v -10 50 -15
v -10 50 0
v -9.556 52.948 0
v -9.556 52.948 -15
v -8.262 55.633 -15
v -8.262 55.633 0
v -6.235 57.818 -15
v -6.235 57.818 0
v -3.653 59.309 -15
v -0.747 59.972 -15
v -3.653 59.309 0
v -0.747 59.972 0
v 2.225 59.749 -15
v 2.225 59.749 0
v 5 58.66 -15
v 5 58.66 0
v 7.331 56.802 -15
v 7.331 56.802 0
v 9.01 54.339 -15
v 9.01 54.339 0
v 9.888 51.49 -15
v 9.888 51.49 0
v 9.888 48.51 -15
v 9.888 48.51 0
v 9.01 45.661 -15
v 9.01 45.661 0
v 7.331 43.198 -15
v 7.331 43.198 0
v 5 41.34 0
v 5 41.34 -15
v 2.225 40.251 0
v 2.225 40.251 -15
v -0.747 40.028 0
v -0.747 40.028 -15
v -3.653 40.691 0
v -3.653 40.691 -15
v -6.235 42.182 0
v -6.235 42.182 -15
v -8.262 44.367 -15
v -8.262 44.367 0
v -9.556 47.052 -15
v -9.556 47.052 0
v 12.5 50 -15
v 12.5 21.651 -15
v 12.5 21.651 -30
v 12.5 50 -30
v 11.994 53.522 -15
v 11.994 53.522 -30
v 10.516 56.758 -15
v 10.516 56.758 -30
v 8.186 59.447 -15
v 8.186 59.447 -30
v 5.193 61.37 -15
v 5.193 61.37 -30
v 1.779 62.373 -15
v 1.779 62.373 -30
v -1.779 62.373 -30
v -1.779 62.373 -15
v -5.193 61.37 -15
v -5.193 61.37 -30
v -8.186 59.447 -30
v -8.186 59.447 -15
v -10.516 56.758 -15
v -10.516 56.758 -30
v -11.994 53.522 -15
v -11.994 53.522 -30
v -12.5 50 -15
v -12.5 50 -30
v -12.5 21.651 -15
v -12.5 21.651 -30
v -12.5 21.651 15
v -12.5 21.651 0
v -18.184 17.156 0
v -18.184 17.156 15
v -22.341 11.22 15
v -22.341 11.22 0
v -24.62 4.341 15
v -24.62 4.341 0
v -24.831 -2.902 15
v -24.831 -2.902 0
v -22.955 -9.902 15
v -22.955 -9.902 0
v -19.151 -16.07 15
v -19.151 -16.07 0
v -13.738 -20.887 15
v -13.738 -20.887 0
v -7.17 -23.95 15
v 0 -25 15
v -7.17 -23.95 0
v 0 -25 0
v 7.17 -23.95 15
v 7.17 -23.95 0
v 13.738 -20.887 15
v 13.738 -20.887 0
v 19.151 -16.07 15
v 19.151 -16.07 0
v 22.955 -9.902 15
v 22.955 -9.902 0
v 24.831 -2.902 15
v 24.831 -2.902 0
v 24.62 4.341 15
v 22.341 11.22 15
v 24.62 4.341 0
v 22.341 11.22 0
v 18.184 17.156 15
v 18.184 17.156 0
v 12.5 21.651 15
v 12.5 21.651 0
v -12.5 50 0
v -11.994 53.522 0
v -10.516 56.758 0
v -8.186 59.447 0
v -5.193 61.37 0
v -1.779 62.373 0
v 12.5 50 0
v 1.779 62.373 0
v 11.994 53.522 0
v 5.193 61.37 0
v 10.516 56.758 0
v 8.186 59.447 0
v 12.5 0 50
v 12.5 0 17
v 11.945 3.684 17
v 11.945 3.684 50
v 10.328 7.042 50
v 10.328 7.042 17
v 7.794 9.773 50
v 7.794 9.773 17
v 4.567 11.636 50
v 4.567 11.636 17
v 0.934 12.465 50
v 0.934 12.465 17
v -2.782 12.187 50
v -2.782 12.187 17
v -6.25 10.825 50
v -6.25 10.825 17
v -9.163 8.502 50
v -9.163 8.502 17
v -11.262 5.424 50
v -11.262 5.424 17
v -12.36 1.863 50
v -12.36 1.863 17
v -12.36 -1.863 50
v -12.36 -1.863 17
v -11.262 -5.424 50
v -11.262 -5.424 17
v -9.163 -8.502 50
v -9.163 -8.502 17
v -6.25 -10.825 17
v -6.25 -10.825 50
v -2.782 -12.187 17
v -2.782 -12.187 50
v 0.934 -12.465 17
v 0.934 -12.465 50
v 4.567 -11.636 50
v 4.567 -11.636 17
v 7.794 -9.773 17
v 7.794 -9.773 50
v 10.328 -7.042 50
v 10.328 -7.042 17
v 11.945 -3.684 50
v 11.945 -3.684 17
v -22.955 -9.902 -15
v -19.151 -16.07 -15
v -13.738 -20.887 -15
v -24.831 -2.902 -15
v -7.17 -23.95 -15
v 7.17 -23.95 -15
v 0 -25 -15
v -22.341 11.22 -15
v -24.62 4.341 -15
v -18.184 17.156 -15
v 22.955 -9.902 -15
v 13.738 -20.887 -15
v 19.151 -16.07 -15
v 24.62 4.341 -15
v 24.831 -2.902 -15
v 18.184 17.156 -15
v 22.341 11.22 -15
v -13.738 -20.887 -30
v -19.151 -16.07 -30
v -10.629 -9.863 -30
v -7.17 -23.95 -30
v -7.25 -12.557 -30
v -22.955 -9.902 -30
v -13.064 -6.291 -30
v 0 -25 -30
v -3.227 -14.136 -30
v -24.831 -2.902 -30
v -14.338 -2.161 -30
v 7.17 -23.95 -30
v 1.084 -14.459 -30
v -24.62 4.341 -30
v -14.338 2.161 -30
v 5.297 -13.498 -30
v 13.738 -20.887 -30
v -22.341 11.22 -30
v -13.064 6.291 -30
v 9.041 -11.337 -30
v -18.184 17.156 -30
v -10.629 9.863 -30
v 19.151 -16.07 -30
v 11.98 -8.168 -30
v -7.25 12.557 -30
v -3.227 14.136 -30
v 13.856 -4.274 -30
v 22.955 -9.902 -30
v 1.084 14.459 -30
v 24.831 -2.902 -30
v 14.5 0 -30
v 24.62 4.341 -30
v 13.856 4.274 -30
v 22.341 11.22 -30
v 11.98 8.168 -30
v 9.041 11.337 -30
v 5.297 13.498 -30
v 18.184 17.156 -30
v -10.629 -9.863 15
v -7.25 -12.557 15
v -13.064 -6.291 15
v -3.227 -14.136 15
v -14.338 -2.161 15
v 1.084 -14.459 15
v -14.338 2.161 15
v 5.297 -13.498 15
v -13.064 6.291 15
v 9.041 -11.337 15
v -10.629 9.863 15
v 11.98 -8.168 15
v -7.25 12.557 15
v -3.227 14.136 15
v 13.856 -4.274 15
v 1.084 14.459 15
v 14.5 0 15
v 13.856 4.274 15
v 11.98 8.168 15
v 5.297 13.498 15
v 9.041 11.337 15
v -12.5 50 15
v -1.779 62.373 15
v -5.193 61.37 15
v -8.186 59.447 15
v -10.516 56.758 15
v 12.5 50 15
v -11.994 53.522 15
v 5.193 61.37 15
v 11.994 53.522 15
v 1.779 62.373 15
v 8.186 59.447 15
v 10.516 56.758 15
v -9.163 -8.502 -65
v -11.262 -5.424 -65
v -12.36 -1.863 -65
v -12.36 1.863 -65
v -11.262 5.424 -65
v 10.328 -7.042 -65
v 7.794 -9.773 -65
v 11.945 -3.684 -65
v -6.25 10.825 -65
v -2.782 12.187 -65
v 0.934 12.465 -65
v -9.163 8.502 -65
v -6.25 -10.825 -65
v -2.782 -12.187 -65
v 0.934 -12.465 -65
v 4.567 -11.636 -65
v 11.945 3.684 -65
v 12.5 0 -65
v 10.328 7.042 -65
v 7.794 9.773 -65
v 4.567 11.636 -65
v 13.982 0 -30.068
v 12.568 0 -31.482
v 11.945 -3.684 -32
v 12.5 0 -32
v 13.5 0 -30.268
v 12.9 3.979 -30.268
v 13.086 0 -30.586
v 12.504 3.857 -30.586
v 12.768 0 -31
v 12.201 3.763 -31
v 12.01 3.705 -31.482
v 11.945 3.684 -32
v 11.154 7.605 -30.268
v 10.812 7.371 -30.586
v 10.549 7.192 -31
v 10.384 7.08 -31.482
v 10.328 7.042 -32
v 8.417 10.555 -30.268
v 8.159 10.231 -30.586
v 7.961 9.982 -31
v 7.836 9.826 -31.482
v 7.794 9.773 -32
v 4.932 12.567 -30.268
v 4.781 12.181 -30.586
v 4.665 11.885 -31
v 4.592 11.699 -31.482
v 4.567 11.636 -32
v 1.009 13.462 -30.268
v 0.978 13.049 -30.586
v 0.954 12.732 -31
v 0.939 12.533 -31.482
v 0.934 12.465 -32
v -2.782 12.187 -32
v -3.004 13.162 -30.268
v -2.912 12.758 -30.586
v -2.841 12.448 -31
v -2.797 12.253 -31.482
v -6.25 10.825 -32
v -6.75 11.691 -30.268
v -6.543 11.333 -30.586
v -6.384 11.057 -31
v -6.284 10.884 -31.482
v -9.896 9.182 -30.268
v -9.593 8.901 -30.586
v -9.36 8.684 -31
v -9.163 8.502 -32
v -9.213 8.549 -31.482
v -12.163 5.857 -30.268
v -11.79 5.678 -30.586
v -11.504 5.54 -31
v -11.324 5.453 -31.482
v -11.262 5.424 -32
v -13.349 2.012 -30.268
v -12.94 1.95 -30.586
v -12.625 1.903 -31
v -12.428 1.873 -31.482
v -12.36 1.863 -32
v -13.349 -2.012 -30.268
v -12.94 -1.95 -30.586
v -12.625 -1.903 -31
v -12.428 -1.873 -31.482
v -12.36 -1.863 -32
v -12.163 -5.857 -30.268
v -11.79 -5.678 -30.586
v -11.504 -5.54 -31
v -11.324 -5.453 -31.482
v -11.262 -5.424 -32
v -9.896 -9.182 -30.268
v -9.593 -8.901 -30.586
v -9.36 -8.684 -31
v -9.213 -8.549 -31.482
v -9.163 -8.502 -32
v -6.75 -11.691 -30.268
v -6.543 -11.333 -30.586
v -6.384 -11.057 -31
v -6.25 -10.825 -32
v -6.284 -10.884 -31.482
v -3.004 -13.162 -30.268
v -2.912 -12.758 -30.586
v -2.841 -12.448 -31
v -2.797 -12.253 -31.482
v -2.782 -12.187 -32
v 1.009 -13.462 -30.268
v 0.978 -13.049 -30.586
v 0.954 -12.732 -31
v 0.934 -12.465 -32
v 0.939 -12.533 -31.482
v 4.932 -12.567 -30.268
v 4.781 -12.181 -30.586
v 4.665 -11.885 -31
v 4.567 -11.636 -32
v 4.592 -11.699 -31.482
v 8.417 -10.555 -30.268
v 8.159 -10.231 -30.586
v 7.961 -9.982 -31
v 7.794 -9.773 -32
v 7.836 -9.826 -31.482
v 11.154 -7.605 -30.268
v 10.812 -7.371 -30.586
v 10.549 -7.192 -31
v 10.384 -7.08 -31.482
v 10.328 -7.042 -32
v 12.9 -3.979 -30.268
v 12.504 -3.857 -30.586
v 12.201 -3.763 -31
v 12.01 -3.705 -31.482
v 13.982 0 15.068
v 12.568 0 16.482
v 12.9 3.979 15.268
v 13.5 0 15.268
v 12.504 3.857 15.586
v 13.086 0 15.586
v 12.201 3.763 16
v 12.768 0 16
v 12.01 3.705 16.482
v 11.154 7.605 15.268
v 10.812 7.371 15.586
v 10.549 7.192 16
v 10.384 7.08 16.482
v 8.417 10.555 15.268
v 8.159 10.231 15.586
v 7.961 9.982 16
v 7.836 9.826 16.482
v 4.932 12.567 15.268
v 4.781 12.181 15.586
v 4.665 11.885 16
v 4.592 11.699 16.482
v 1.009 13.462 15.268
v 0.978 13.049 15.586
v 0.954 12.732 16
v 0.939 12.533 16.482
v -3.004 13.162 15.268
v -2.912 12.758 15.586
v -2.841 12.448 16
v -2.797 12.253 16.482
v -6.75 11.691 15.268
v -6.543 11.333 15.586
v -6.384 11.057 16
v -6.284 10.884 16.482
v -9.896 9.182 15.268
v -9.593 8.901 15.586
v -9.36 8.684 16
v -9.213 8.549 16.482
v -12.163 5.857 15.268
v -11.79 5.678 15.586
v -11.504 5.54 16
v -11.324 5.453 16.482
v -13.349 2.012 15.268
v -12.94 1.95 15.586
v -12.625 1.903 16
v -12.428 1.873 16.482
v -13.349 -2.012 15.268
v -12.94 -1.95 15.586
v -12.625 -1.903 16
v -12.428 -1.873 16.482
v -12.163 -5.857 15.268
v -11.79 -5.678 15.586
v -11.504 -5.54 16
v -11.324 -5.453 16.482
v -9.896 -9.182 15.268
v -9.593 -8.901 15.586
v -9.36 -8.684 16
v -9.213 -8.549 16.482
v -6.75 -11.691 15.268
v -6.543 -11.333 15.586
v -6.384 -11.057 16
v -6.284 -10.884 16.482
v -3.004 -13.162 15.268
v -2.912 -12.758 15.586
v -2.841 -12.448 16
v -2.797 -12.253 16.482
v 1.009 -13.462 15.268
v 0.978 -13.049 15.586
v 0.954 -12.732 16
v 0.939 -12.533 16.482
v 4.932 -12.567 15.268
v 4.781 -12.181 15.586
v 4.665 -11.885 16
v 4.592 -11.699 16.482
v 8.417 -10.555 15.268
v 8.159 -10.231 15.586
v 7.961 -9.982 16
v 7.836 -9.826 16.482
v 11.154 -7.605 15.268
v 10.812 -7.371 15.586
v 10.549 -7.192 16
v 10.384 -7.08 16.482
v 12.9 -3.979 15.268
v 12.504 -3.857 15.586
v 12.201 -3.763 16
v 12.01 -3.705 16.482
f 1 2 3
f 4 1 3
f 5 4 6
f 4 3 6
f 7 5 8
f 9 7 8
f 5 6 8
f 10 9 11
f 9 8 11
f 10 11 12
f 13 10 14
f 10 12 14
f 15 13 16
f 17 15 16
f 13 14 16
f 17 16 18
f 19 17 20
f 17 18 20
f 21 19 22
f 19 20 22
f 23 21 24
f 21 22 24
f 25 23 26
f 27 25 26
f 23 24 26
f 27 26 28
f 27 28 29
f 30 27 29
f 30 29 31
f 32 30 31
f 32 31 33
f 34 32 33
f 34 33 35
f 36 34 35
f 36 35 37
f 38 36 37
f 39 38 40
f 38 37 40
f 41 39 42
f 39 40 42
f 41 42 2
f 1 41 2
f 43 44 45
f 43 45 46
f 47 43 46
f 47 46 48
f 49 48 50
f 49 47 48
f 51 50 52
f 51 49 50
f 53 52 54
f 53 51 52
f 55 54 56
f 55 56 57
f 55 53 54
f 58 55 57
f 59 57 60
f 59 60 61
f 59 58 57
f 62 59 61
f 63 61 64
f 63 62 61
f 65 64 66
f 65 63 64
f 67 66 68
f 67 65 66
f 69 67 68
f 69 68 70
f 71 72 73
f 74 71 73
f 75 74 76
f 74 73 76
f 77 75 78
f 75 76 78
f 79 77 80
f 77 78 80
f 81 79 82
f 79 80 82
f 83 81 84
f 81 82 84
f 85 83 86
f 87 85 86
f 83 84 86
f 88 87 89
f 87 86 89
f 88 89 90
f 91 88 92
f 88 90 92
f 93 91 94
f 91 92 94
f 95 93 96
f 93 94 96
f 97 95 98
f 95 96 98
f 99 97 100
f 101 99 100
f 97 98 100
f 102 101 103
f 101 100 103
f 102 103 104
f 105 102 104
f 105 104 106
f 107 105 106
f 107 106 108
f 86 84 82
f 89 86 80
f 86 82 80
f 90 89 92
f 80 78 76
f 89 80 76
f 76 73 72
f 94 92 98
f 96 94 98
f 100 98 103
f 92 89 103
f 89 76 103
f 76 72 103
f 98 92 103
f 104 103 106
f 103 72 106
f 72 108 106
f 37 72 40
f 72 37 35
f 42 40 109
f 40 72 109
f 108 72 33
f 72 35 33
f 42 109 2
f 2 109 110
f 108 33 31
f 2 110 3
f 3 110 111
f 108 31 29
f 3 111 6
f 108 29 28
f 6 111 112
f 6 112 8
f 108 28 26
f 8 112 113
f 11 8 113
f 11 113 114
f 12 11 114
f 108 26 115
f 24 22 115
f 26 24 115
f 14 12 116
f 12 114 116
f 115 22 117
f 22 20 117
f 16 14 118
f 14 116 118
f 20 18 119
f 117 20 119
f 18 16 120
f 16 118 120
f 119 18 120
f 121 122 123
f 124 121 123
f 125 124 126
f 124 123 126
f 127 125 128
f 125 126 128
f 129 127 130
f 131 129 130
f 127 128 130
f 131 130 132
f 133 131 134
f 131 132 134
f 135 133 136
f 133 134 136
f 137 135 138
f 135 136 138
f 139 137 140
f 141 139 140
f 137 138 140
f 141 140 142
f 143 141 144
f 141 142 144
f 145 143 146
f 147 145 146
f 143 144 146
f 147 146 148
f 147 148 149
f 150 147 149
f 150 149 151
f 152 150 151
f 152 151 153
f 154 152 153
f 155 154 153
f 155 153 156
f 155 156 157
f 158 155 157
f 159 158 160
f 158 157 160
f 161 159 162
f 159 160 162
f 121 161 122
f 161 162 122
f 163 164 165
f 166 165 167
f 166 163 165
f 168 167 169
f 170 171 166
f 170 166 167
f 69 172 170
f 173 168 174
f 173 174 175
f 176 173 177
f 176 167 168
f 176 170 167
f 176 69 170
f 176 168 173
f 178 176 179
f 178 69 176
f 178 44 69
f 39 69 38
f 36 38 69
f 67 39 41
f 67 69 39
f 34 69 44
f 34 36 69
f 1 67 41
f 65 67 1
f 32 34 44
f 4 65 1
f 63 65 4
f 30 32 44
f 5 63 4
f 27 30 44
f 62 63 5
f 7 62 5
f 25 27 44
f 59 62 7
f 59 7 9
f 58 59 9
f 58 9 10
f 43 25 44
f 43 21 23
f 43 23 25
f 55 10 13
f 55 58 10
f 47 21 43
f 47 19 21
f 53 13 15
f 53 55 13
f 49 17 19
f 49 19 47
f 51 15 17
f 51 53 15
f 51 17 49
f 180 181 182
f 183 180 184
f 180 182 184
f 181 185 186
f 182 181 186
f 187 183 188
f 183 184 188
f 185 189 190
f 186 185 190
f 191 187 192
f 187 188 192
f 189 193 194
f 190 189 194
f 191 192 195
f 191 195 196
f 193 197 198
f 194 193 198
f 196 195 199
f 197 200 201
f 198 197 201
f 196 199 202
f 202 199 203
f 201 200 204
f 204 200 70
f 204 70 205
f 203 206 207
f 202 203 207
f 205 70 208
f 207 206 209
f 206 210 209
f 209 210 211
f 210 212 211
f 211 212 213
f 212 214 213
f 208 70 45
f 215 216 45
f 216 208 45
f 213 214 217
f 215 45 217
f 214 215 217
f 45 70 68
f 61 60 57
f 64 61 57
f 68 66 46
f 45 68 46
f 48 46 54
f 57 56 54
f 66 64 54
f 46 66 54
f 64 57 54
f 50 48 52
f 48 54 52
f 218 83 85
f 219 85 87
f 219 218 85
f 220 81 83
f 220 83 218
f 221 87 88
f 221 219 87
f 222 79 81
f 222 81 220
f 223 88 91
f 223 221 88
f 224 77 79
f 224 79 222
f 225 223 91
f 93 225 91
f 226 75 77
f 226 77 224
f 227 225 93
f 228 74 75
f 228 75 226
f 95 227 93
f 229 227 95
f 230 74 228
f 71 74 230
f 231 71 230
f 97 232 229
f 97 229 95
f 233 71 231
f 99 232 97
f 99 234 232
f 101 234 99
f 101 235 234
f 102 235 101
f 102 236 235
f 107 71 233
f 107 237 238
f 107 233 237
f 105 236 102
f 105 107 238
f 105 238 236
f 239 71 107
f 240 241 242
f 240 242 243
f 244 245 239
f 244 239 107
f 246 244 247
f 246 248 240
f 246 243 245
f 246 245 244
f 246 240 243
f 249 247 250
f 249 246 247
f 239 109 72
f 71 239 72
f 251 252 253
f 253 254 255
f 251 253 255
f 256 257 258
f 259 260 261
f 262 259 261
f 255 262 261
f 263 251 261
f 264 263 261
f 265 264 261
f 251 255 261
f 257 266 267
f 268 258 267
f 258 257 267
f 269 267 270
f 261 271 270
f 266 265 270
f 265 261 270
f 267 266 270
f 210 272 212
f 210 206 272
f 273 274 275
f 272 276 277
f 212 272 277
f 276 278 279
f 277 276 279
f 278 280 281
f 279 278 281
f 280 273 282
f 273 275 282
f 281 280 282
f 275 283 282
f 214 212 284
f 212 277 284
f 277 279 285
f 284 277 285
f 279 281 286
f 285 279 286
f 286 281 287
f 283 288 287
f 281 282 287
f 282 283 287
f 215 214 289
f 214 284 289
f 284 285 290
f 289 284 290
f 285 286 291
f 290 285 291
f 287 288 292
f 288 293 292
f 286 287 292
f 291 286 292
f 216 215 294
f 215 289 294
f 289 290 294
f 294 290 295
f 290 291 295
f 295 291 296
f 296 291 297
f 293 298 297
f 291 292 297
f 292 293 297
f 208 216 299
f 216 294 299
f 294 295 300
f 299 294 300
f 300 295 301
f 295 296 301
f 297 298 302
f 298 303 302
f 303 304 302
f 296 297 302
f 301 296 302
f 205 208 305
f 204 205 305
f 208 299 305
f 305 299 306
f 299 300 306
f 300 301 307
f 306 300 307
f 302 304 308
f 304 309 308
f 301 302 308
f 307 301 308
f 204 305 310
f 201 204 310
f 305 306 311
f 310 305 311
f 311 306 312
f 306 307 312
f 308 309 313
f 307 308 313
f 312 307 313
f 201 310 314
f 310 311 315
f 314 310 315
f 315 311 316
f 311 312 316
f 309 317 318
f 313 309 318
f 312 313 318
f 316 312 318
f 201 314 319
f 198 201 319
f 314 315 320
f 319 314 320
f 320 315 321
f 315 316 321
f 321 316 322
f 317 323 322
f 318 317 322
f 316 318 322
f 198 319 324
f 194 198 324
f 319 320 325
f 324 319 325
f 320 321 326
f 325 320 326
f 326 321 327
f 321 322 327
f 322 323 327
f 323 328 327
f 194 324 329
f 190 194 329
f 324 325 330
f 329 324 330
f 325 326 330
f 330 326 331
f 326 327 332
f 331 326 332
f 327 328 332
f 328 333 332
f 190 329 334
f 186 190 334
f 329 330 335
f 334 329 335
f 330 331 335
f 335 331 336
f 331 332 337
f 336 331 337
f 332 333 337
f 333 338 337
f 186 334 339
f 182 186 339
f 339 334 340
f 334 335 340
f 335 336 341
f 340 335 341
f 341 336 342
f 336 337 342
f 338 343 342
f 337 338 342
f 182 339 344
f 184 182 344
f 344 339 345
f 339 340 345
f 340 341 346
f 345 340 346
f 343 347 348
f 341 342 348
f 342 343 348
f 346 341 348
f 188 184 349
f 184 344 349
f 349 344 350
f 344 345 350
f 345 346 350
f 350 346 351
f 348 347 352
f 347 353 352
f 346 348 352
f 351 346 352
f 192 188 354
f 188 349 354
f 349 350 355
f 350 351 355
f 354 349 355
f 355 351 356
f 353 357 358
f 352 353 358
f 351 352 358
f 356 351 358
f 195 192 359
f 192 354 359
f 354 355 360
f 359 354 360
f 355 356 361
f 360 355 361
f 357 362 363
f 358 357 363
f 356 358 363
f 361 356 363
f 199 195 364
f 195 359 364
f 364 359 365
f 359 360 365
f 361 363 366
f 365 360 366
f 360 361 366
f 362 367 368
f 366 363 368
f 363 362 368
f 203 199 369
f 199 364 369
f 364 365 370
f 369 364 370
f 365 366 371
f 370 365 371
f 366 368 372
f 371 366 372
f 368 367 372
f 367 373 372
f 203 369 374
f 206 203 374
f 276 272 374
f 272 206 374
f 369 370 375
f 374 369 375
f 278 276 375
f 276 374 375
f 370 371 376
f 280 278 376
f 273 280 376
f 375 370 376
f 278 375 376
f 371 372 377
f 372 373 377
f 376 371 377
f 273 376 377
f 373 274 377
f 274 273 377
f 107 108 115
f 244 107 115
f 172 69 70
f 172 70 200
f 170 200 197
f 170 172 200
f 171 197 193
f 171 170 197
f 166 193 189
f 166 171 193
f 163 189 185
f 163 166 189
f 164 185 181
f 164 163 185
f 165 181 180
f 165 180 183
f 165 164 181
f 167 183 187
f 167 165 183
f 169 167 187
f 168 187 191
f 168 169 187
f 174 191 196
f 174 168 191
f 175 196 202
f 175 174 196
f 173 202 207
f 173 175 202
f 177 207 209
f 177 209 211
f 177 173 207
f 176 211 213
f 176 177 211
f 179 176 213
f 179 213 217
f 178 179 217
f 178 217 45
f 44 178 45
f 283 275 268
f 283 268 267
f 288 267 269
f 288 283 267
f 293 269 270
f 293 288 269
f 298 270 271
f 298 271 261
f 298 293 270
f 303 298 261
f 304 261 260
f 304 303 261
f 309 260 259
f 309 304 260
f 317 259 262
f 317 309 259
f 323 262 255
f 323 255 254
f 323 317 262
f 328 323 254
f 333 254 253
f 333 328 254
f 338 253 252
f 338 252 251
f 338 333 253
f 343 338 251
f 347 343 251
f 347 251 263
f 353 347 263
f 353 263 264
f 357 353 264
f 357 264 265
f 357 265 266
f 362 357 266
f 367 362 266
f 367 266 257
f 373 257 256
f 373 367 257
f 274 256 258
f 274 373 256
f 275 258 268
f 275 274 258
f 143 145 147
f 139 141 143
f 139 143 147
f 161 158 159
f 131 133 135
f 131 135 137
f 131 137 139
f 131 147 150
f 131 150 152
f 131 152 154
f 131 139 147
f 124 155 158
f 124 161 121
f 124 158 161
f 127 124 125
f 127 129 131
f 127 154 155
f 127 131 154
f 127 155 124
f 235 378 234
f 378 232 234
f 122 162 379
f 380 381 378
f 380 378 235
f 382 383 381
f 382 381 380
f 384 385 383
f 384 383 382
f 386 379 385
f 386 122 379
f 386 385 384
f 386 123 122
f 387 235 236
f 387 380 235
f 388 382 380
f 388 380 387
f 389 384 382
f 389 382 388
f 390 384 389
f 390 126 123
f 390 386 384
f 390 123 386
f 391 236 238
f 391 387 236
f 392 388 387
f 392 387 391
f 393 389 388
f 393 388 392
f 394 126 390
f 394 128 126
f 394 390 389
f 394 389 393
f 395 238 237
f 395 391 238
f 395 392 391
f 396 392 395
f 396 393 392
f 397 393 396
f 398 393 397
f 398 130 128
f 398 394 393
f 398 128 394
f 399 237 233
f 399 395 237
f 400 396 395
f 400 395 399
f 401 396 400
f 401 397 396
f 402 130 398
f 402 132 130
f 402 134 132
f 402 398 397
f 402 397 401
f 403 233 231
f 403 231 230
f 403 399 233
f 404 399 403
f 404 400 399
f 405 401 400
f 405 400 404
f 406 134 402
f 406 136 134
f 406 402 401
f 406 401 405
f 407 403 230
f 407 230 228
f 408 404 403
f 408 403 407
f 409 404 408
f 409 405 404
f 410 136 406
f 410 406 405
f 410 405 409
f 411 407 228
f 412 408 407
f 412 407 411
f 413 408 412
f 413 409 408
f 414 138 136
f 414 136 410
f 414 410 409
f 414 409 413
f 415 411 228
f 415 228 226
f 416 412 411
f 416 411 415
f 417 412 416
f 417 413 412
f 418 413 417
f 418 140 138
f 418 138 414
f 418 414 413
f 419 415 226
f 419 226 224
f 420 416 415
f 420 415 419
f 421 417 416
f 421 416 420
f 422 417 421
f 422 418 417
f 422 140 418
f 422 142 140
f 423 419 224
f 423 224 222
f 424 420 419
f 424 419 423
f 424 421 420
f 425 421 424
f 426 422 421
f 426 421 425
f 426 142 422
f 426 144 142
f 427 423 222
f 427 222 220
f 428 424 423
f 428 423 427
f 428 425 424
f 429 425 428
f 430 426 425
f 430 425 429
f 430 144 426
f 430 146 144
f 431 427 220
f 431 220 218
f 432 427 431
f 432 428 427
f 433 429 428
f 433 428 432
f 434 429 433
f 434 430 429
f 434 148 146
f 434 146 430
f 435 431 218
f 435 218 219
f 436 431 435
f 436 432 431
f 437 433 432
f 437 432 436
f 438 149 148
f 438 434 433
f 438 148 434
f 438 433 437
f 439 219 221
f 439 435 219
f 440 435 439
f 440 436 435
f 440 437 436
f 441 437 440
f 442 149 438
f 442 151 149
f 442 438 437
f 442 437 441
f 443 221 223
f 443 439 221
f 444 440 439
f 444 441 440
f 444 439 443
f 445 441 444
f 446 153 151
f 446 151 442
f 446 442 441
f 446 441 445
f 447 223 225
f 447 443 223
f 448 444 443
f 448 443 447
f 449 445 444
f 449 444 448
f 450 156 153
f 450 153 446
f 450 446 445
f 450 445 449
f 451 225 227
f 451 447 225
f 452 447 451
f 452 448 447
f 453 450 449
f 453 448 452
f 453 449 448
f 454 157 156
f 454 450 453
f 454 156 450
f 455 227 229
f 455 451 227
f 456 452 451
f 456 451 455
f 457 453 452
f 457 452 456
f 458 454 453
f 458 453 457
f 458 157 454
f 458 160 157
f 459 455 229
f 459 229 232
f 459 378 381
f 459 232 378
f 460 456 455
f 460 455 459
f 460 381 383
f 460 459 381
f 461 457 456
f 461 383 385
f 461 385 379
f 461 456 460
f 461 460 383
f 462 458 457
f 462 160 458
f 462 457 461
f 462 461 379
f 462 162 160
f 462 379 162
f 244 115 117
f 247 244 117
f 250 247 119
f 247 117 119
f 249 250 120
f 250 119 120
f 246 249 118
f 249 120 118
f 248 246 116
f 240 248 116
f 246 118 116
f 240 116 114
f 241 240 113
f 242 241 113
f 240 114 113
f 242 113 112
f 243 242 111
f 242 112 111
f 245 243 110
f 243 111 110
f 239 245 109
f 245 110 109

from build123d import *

# Parameters (mm, degrees)
BOSS_EXTRUDE1_DEPTH  = 15
SKETCH2_R            = 12.5
BOSS_EXTRUDE2_DEPTH  = 35
FILLET1_R            = 2
SKETCH3_R            = 10
BOSS_EXTRUDE3_DEPTH  = 15
FILLET1_OF_MIRROR1_R = 2


with BuildPart() as part:
    # Sketch1 → Boss-Extrude1 (new body)
    with BuildSketch(Plane.XY):
        with BuildLine():
            Line((-12.5, 50), (-12.5, 21.650635095))
            ThreePointArc((-12.5, 21.650635095), (0, -25), (12.5, 21.650635095))
            Line((12.5, 21.650635095), (12.5, 50))
            ThreePointArc((12.5, 50), (0, 62.5), (-12.5, 50))
        make_face()
    boss_extrude1 = extrude(amount=BOSS_EXTRUDE1_DEPTH)

    # Sketch2 → Boss-Extrude2 (add)
    with BuildSketch(Plane.XY.offset(15)):
        Circle(SKETCH2_R)
    boss_extrude2 = extrude(amount=BOSS_EXTRUDE2_DEPTH)

    # Fillet1
    fillet1_edges = [part.edges().sort_by_distance(p)[0] for p in [
        (-12.5, 0, 15),
    ]]
    fillet(fillet1_edges, radius=FILLET1_R)

    # Sketch3 → Boss-Extrude3 (add)
    with BuildSketch(Plane(origin=(0, 0, 0), x_dir=(-1, 0, 0), z_dir=(0, 0, -1))):
        with Locations((0, 50)):
            Circle(SKETCH3_R)
    extrude(amount=BOSS_EXTRUDE3_DEPTH)

    # Mirror1: Boss-Extrude1, Boss-Extrude2 across plane
    add(boss_extrude1.mirror(Plane.XY.offset(-7.5)))
    add(boss_extrude2.mirror(Plane.XY.offset(-7.5)))

    # Fillet1 of Mirror1
    fillet1_of_mirror1_edges = [part.edges().sort_by_distance(p)[0] for p in [
        (-12.5, 0, -30),
    ]]
    fillet(fillet1_of_mirror1_edges, radius=FILLET1_OF_MIRROR1_R)


solid = part.part
